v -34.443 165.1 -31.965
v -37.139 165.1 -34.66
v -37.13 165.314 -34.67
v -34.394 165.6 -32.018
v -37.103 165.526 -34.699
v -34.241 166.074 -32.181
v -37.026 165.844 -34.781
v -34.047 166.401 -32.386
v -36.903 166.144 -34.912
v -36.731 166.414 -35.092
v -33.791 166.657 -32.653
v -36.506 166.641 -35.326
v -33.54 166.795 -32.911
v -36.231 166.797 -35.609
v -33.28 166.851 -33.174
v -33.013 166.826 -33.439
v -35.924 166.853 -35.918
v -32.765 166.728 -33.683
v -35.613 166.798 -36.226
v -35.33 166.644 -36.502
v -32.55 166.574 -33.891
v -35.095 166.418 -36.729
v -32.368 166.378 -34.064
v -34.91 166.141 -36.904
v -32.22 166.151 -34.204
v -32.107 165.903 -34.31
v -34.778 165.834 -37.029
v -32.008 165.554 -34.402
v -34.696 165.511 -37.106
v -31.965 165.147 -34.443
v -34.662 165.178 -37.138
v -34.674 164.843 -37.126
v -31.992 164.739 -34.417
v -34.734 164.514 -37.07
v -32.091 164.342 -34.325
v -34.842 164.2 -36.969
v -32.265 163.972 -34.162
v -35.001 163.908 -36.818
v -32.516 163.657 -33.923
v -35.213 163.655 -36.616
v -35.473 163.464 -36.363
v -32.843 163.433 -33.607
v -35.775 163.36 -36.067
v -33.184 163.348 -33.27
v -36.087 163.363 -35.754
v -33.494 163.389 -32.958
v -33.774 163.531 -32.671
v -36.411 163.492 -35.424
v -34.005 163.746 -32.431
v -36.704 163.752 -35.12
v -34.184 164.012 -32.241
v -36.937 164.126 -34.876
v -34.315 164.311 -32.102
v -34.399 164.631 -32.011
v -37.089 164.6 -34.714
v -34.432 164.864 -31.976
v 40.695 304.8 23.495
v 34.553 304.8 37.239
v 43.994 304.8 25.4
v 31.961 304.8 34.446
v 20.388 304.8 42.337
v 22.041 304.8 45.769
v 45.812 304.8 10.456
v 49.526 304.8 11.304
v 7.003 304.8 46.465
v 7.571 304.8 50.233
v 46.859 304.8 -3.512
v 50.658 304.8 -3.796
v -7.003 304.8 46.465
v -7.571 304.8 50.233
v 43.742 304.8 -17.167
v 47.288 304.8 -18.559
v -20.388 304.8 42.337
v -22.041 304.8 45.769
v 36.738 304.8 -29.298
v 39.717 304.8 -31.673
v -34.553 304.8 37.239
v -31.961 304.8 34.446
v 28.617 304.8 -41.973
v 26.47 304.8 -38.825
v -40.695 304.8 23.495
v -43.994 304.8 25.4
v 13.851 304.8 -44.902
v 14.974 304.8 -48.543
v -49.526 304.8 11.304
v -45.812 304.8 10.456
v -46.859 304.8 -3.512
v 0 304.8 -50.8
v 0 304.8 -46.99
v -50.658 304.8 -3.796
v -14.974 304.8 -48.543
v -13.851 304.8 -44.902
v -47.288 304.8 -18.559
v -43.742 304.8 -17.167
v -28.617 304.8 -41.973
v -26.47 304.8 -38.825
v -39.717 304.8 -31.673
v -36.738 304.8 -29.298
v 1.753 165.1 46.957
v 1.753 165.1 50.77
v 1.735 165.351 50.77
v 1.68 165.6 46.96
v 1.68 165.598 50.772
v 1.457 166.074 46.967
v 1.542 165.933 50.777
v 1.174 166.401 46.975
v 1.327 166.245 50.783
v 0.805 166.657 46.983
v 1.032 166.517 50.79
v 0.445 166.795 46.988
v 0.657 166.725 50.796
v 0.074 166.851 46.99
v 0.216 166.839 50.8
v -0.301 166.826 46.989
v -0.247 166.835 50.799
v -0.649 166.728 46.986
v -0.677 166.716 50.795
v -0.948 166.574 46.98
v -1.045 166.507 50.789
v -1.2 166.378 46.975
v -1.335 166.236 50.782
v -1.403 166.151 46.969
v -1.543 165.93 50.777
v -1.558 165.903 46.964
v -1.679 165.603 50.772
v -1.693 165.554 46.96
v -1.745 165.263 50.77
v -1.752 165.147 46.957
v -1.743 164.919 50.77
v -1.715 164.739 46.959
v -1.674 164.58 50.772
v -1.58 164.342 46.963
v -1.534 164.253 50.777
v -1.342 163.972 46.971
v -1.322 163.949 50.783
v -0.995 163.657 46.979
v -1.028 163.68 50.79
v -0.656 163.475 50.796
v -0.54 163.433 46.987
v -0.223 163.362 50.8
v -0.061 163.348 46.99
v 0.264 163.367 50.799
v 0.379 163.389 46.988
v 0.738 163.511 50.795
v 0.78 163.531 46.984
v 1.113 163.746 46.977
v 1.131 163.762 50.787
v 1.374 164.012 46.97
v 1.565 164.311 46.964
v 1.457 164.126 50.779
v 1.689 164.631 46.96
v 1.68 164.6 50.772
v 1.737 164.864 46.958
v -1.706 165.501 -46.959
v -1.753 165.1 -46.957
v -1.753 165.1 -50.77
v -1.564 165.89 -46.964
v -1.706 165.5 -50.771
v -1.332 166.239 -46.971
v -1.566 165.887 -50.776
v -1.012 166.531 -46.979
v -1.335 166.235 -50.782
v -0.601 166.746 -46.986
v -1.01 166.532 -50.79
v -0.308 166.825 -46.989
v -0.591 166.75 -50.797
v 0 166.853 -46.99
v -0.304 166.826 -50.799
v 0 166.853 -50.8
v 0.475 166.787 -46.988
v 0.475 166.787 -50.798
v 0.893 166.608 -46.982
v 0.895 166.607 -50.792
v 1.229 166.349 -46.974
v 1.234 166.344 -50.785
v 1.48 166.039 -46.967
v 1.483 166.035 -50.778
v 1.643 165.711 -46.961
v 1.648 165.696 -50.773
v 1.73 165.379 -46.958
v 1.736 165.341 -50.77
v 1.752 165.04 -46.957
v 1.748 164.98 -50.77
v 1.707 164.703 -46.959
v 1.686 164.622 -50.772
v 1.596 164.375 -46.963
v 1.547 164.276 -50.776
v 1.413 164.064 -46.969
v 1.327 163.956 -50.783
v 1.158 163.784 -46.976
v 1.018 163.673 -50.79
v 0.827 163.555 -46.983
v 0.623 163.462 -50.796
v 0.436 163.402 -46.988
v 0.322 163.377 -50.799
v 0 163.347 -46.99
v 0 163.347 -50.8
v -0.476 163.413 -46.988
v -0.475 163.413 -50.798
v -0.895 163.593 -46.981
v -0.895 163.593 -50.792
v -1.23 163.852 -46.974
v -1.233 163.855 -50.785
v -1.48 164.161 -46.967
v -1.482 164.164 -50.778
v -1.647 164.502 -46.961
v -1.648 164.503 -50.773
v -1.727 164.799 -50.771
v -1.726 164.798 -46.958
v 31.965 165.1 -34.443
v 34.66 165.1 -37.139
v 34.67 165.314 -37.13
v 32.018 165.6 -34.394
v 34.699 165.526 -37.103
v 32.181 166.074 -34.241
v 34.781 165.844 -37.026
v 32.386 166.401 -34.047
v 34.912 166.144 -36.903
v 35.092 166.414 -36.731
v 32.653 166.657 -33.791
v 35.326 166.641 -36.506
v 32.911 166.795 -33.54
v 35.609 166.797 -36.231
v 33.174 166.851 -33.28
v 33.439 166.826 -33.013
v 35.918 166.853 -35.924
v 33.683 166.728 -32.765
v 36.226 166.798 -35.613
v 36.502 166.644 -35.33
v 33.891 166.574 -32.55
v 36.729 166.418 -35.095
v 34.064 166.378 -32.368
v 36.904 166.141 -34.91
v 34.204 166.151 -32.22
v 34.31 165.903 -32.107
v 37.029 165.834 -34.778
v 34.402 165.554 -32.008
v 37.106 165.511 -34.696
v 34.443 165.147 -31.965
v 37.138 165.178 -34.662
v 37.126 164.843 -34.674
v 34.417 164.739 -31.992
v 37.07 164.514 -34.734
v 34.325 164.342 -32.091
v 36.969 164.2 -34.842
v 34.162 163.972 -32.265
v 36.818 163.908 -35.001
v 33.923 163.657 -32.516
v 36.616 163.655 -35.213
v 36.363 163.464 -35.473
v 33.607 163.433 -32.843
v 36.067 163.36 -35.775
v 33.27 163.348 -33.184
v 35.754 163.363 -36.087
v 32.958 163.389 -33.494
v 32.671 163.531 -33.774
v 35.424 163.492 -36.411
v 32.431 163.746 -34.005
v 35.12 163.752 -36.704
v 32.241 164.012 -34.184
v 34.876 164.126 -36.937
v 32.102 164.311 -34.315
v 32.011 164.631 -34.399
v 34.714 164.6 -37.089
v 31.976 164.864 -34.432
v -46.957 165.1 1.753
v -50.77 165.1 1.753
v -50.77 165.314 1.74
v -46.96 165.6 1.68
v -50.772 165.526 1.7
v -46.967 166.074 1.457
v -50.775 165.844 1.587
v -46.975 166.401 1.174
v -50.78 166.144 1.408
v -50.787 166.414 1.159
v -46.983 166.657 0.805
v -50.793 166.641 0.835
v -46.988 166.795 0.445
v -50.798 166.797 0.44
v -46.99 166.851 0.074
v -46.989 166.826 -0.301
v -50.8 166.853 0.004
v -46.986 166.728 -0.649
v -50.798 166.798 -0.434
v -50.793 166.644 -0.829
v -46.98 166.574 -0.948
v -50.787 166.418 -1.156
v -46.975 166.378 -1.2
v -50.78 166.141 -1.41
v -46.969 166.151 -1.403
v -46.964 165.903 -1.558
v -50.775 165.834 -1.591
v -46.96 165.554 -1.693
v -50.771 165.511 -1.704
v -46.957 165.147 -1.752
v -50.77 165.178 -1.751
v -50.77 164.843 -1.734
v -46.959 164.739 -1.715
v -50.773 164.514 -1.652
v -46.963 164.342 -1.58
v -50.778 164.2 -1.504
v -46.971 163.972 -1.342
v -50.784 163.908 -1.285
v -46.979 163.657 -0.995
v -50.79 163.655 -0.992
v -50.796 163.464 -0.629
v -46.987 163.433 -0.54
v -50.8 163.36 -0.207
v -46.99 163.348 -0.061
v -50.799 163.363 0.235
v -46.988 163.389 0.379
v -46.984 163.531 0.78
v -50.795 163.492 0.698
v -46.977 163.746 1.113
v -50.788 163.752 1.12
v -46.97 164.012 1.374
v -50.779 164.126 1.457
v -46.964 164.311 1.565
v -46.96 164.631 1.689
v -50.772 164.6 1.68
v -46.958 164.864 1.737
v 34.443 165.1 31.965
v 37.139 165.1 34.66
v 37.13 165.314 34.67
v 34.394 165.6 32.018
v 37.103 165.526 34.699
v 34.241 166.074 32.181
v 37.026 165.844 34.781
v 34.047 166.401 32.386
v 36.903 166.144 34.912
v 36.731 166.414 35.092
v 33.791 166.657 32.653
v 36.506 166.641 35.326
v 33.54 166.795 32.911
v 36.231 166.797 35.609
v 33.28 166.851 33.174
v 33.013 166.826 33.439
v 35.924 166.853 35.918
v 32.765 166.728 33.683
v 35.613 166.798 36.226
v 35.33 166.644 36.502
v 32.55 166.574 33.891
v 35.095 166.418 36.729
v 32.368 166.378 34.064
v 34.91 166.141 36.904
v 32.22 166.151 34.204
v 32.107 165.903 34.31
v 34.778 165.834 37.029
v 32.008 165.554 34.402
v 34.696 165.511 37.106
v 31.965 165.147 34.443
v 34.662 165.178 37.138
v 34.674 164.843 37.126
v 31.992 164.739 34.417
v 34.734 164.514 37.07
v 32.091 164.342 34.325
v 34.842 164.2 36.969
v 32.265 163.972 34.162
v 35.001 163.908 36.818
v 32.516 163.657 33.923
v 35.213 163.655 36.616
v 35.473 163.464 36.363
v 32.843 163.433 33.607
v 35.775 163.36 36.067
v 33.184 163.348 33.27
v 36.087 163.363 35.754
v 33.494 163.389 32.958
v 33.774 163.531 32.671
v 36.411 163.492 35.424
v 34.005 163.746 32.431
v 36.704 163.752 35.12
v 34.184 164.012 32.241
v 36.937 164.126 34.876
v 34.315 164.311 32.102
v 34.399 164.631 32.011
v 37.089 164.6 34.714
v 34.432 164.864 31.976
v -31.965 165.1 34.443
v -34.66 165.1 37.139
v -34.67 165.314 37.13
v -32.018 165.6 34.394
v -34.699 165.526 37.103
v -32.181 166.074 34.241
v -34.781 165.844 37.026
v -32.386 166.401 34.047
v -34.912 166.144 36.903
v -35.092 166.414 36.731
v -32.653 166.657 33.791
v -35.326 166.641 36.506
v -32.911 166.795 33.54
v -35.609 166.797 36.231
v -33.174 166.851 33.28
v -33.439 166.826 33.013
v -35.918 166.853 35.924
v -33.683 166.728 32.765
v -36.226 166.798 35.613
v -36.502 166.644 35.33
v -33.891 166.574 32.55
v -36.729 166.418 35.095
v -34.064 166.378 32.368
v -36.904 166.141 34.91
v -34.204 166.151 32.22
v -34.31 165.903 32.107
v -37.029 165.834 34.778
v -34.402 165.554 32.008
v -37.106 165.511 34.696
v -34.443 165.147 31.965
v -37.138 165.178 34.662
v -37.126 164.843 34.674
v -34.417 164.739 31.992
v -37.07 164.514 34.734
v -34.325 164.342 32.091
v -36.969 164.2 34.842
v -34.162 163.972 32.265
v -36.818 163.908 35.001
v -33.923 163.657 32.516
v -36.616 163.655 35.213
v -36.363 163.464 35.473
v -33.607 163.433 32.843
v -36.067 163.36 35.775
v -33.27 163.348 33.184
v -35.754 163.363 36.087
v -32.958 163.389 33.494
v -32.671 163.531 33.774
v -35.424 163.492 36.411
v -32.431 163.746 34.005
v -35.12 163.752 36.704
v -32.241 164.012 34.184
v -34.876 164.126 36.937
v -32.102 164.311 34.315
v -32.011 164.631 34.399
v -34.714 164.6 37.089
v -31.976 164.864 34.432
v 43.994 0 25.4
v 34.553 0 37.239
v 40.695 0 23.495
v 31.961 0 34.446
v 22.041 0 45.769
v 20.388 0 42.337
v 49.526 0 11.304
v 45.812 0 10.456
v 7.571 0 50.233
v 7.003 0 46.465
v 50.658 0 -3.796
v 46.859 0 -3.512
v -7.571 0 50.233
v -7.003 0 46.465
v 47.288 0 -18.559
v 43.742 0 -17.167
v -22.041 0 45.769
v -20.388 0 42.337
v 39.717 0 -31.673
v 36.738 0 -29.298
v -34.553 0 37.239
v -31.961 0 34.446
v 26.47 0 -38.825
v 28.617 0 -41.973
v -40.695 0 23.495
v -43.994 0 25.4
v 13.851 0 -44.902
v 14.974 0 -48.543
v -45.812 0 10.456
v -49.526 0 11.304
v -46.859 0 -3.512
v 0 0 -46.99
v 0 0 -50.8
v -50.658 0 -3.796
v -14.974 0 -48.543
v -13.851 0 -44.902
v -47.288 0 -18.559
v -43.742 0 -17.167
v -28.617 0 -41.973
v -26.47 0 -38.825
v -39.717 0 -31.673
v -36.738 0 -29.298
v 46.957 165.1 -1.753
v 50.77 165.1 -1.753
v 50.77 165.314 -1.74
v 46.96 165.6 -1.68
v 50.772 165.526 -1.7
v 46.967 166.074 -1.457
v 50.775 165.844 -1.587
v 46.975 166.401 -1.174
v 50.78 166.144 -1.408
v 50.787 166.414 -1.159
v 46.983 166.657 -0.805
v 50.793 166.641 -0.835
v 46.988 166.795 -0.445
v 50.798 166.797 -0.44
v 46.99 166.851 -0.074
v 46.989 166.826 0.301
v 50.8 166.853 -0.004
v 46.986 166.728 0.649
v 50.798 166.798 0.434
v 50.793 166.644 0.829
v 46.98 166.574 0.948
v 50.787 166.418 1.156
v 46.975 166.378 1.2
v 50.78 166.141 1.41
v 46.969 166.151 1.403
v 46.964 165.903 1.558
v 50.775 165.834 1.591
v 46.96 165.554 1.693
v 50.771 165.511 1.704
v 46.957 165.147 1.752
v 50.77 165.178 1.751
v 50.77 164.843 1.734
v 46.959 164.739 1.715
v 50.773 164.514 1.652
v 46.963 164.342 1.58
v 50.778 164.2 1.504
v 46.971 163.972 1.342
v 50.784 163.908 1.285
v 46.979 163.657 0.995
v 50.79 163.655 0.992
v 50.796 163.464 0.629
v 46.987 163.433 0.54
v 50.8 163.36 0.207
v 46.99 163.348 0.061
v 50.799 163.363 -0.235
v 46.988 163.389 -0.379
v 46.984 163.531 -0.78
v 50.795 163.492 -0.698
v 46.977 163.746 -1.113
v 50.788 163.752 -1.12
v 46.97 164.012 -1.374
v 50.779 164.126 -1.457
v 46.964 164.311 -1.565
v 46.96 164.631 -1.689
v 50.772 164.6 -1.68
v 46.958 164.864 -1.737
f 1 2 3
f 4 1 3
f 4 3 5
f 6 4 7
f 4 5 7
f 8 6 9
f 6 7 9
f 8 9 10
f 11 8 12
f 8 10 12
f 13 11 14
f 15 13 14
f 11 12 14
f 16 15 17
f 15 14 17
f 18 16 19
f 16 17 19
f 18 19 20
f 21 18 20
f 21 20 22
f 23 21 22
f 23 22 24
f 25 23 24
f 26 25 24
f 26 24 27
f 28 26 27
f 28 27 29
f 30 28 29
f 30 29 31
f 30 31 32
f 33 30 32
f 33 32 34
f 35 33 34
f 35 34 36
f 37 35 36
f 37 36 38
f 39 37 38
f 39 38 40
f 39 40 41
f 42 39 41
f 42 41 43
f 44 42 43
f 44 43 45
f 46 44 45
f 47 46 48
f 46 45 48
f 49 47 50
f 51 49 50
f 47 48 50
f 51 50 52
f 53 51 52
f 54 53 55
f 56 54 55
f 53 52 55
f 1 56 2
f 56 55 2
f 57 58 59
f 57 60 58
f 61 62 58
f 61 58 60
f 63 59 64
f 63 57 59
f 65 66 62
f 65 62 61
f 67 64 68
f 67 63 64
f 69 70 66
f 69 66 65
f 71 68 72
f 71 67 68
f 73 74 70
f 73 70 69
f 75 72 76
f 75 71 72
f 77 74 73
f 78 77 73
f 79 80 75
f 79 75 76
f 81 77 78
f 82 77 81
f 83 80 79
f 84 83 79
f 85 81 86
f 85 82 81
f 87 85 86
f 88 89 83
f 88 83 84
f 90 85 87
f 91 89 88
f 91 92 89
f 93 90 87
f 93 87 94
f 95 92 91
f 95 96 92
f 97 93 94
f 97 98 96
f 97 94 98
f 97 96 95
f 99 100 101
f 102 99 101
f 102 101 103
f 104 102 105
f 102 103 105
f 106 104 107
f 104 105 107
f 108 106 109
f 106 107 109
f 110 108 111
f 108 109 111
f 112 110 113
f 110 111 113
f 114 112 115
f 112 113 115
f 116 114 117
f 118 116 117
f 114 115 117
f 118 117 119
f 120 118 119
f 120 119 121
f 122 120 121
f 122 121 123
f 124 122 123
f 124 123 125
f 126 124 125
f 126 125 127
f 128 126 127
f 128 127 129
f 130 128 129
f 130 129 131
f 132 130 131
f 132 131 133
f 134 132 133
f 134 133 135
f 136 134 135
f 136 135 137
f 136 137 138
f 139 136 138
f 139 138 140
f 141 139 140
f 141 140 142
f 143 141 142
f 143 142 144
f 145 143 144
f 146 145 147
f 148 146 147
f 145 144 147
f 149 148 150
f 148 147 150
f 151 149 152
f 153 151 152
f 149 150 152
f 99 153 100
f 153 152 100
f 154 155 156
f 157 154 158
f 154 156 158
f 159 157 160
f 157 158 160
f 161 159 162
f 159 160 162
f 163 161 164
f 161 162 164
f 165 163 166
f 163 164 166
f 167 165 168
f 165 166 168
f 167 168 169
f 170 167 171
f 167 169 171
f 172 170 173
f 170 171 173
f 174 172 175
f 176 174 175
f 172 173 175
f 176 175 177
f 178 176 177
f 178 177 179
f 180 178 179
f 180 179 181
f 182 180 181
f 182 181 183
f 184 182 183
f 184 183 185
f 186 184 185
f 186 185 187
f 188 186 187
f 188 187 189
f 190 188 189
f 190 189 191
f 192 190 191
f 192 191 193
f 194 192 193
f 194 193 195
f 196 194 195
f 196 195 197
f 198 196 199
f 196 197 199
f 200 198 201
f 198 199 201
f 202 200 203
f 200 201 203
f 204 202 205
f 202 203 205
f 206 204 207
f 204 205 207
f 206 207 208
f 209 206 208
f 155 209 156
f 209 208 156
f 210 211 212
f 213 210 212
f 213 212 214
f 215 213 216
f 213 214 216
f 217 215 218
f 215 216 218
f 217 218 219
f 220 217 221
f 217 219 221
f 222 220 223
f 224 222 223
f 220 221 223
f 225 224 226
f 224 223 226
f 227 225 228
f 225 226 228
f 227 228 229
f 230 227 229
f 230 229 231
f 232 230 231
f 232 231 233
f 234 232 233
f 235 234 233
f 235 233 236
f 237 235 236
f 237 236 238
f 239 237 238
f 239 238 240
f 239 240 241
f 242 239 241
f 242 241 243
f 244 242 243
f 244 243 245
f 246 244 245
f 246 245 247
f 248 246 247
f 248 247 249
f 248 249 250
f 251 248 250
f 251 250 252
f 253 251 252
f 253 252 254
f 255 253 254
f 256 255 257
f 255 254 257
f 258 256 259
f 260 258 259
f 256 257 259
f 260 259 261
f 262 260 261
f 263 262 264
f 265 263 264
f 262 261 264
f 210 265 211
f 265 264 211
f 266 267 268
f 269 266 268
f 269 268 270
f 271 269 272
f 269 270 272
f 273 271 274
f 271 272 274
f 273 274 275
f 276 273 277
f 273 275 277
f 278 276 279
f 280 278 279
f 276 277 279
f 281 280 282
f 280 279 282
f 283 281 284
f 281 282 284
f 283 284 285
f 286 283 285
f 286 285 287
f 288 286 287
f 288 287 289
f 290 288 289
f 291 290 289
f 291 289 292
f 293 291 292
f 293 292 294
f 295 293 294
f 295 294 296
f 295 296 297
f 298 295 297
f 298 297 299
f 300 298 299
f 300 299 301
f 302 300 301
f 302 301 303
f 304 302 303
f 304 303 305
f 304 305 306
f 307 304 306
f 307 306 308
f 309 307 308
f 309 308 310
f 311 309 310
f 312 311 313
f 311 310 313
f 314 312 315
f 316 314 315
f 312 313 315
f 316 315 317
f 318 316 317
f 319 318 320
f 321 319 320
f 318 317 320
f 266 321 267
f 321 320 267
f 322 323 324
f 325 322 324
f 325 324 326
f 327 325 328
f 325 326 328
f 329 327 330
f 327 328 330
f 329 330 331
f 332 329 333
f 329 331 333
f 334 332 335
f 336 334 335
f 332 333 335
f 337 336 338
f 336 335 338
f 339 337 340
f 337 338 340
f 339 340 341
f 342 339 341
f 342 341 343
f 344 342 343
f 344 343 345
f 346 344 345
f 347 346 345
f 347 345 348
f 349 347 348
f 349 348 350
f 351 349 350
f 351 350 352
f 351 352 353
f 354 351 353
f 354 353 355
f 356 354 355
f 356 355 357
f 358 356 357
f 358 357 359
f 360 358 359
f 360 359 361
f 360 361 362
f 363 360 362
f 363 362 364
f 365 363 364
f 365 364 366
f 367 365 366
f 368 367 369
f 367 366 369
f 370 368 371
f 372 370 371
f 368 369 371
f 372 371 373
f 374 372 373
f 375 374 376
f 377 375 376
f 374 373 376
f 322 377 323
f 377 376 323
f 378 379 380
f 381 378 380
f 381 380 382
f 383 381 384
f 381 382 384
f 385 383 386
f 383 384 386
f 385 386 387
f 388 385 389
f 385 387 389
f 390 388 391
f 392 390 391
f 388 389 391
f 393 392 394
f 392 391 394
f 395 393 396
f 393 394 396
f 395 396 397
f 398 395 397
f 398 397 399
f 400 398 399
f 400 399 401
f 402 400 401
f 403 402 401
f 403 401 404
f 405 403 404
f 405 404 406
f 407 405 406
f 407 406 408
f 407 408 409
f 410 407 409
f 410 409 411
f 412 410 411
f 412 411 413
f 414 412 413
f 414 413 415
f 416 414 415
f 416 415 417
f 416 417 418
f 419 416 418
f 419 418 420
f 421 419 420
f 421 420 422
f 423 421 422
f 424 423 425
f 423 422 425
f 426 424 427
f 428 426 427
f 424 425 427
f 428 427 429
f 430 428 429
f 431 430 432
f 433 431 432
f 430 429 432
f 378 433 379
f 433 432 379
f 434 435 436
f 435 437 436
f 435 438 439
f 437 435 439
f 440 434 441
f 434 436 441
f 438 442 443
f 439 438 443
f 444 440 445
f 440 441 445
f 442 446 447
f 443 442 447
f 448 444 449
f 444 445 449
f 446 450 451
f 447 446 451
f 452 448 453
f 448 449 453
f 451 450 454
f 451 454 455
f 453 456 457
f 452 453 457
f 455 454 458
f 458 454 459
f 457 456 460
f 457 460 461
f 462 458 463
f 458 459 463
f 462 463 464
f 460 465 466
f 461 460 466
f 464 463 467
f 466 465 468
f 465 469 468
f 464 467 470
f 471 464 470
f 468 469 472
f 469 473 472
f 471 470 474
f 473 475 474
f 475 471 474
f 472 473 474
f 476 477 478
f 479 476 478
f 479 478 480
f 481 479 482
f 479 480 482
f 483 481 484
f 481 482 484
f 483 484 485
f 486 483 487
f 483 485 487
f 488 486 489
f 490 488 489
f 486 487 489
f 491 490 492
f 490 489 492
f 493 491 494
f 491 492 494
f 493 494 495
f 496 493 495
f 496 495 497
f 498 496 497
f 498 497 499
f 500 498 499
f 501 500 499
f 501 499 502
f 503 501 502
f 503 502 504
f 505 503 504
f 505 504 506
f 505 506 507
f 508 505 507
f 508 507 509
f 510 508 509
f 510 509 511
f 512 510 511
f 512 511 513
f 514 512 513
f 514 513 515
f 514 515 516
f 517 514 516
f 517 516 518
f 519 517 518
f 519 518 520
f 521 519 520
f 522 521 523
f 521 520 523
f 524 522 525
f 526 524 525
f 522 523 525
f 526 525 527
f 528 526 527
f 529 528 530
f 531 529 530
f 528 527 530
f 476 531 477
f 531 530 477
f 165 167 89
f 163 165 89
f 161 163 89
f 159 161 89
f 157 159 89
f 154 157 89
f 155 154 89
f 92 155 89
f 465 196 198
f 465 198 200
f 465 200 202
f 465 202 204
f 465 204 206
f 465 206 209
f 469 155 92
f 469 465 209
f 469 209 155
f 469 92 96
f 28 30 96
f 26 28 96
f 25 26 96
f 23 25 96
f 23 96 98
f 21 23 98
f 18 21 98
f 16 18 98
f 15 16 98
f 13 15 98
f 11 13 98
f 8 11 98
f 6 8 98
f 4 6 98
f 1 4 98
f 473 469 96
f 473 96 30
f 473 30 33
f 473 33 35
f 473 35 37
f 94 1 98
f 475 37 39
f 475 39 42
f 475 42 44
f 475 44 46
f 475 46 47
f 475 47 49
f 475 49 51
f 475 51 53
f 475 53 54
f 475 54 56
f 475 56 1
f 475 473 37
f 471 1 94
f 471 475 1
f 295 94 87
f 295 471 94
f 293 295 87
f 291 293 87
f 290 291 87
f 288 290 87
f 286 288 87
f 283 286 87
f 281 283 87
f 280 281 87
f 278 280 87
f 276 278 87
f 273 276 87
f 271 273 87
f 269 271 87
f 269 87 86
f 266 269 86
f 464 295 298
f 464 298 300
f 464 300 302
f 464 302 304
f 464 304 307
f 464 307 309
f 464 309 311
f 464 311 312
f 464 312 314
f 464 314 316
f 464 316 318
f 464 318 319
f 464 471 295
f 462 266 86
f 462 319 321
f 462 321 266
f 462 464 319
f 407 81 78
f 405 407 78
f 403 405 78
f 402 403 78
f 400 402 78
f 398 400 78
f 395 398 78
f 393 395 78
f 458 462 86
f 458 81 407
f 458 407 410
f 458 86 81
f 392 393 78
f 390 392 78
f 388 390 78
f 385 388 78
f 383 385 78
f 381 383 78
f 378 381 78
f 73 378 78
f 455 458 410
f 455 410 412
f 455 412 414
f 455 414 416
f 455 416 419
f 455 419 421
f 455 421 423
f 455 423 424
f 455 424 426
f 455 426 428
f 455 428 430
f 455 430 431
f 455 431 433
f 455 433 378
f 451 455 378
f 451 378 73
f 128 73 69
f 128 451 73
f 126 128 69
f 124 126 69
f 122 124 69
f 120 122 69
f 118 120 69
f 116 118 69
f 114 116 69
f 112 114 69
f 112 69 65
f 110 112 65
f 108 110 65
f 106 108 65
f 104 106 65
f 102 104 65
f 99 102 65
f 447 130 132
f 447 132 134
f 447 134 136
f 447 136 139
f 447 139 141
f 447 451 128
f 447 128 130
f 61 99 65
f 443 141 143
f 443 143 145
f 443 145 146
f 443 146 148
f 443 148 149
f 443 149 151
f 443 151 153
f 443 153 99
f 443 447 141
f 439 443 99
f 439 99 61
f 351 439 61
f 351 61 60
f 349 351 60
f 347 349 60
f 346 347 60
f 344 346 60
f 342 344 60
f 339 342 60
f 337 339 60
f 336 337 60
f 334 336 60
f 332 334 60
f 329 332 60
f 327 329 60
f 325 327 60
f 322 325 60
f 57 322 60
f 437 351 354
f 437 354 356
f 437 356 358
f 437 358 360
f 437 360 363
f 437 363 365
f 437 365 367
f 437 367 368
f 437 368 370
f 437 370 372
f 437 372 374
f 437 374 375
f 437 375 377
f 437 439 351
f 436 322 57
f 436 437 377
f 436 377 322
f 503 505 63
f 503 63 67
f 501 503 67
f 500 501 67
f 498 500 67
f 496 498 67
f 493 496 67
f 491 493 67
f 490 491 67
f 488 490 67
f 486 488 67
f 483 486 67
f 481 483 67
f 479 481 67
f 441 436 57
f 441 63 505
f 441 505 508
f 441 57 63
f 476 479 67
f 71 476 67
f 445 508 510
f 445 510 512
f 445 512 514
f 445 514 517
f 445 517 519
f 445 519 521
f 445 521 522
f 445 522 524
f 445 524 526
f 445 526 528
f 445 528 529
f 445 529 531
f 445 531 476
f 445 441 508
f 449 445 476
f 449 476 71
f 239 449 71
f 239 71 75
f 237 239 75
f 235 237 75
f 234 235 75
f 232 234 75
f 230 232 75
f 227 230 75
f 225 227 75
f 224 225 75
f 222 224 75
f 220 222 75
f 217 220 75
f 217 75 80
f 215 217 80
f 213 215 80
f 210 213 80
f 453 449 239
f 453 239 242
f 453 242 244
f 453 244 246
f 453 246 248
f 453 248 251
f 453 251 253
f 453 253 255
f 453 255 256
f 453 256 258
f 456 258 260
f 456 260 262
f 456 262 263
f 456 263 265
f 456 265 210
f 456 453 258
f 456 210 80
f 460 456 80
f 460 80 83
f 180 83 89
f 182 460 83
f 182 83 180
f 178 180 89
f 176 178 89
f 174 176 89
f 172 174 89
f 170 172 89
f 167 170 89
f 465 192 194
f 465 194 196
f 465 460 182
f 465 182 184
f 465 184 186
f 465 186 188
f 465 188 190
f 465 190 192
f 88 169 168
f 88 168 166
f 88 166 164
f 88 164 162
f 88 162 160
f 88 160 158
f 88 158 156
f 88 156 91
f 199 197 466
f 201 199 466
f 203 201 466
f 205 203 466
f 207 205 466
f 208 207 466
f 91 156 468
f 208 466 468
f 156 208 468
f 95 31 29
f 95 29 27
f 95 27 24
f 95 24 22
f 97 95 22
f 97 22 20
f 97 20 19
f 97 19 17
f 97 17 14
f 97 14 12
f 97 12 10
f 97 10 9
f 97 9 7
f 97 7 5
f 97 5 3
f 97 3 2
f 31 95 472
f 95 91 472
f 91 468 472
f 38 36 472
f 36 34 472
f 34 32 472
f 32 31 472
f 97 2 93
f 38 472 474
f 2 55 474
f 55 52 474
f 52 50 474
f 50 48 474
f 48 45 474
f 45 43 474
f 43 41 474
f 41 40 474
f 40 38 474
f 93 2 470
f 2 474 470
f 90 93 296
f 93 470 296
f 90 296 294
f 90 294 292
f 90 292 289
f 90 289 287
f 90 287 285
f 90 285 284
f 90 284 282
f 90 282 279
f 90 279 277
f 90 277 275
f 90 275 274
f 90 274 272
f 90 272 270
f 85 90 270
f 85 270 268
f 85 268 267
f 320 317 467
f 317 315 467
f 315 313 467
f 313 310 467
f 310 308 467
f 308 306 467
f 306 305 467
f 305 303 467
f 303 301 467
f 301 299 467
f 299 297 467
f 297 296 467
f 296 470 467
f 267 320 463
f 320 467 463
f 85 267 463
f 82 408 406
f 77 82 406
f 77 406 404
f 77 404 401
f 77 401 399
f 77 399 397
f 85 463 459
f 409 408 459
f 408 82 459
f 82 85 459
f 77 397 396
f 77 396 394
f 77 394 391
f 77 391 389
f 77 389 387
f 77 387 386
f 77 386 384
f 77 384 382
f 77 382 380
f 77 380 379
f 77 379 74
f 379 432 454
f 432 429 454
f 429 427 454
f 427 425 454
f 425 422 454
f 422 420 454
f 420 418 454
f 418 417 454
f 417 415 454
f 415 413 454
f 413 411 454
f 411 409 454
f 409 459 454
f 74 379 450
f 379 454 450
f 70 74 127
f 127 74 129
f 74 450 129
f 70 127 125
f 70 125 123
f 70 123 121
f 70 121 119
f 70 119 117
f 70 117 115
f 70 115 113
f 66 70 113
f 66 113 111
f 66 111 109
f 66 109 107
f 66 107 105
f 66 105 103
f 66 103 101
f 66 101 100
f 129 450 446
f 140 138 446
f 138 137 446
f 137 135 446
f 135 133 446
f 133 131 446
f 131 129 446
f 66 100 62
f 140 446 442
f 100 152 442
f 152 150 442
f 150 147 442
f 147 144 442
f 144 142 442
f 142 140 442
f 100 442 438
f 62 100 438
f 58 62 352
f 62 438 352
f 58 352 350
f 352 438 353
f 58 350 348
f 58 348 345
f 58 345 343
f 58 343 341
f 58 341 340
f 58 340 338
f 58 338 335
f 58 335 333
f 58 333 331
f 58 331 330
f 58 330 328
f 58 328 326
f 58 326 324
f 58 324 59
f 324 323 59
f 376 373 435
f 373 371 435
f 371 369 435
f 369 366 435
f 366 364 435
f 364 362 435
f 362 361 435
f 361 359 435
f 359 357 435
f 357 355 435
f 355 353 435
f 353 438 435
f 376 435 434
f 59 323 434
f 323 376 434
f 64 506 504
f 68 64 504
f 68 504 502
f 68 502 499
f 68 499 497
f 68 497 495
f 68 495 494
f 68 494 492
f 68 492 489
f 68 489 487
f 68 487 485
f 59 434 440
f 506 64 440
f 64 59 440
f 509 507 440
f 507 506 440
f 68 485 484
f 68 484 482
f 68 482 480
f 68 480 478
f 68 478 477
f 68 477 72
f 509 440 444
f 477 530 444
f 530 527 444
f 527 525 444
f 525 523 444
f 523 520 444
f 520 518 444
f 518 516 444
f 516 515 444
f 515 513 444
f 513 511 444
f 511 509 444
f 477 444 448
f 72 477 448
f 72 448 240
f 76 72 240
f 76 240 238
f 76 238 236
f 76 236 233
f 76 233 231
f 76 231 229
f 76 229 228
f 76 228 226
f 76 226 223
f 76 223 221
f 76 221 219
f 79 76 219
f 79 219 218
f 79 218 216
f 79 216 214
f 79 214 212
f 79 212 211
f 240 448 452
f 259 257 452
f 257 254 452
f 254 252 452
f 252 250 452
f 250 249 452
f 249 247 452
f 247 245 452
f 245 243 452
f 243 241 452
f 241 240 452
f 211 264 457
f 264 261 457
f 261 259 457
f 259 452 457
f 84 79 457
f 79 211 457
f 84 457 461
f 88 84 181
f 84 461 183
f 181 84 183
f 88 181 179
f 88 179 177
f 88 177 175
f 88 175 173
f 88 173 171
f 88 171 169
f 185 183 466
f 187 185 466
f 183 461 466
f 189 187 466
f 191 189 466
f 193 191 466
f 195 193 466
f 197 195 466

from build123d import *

# Parameters (mm, degrees)
SKETCH2_R                 = 50.8
SKETCH2_R_2               = 46.99
COUPLER_EXTRUSION_DEPTH   = 304.8
BULKHEAD_HOLES_REACH      = 327.279
BULKHEAD_HOLES_END_RADIUS = 46.99
SKETCH3_R                 = 1.7526
CIRPATTERN1_COUNT         = 8


with BuildPart() as part:
    # Sketch2 → Coupler Extrusion (new body)
    with BuildSketch(Plane(origin=(0, 0, 0), x_dir=(1, 0, 0), z_dir=(0, 1, 0))):
        with Locations(Location((0, 0, 0), (0, 0, 90))):
            Circle(SKETCH2_R)
        with Locations(Location((0, 0, 0), (0, 0, 90))):
            Circle(SKETCH2_R_2, mode=Mode.SUBTRACT)
    extrude(amount=COUPLER_EXTRUSION_DEPTH)

    # Bulkhead Holes: up to this cylinder (the profile starts outside it)
    bulkhead_holes_end = Plane(origin=(0, 165.1, 0), z_dir=(0, -1, 0)) * Cylinder(BULKHEAD_HOLES_END_RADIUS, 749.538, mode=Mode.PRIVATE)
    # Sketch3 → Bulkhead Holes (cut, up to the surface)
    with BuildSketch(Plane.XY.offset(50.8), mode=Mode.PRIVATE) as bulkhead_holes_sk1:
        with Locations((0, 165.1)):
            Circle(SKETCH3_R)
    bulkhead_holes_tool1 = extrude(bulkhead_holes_sk1.sketch, amount=-BULKHEAD_HOLES_REACH, mode=Mode.PRIVATE) - bulkhead_holes_end
    bulkhead_holes = bulkhead_holes_tool1.solids().sort_by_distance((0, 165.1, 50.8))[0]
    add(bulkhead_holes, mode=Mode.SUBTRACT)

    # CirPattern1: Bulkhead Holes ×8 about axis
    cirpattern1_axis = Axis((0, 304.8, 0), (0, -1, 0))
    for i in range(1, CIRPATTERN1_COUNT):
        add(bulkhead_holes.rotate(cirpattern1_axis, i * 360 / CIRPATTERN1_COUNT), mode=Mode.SUBTRACT)


solid = part.part
